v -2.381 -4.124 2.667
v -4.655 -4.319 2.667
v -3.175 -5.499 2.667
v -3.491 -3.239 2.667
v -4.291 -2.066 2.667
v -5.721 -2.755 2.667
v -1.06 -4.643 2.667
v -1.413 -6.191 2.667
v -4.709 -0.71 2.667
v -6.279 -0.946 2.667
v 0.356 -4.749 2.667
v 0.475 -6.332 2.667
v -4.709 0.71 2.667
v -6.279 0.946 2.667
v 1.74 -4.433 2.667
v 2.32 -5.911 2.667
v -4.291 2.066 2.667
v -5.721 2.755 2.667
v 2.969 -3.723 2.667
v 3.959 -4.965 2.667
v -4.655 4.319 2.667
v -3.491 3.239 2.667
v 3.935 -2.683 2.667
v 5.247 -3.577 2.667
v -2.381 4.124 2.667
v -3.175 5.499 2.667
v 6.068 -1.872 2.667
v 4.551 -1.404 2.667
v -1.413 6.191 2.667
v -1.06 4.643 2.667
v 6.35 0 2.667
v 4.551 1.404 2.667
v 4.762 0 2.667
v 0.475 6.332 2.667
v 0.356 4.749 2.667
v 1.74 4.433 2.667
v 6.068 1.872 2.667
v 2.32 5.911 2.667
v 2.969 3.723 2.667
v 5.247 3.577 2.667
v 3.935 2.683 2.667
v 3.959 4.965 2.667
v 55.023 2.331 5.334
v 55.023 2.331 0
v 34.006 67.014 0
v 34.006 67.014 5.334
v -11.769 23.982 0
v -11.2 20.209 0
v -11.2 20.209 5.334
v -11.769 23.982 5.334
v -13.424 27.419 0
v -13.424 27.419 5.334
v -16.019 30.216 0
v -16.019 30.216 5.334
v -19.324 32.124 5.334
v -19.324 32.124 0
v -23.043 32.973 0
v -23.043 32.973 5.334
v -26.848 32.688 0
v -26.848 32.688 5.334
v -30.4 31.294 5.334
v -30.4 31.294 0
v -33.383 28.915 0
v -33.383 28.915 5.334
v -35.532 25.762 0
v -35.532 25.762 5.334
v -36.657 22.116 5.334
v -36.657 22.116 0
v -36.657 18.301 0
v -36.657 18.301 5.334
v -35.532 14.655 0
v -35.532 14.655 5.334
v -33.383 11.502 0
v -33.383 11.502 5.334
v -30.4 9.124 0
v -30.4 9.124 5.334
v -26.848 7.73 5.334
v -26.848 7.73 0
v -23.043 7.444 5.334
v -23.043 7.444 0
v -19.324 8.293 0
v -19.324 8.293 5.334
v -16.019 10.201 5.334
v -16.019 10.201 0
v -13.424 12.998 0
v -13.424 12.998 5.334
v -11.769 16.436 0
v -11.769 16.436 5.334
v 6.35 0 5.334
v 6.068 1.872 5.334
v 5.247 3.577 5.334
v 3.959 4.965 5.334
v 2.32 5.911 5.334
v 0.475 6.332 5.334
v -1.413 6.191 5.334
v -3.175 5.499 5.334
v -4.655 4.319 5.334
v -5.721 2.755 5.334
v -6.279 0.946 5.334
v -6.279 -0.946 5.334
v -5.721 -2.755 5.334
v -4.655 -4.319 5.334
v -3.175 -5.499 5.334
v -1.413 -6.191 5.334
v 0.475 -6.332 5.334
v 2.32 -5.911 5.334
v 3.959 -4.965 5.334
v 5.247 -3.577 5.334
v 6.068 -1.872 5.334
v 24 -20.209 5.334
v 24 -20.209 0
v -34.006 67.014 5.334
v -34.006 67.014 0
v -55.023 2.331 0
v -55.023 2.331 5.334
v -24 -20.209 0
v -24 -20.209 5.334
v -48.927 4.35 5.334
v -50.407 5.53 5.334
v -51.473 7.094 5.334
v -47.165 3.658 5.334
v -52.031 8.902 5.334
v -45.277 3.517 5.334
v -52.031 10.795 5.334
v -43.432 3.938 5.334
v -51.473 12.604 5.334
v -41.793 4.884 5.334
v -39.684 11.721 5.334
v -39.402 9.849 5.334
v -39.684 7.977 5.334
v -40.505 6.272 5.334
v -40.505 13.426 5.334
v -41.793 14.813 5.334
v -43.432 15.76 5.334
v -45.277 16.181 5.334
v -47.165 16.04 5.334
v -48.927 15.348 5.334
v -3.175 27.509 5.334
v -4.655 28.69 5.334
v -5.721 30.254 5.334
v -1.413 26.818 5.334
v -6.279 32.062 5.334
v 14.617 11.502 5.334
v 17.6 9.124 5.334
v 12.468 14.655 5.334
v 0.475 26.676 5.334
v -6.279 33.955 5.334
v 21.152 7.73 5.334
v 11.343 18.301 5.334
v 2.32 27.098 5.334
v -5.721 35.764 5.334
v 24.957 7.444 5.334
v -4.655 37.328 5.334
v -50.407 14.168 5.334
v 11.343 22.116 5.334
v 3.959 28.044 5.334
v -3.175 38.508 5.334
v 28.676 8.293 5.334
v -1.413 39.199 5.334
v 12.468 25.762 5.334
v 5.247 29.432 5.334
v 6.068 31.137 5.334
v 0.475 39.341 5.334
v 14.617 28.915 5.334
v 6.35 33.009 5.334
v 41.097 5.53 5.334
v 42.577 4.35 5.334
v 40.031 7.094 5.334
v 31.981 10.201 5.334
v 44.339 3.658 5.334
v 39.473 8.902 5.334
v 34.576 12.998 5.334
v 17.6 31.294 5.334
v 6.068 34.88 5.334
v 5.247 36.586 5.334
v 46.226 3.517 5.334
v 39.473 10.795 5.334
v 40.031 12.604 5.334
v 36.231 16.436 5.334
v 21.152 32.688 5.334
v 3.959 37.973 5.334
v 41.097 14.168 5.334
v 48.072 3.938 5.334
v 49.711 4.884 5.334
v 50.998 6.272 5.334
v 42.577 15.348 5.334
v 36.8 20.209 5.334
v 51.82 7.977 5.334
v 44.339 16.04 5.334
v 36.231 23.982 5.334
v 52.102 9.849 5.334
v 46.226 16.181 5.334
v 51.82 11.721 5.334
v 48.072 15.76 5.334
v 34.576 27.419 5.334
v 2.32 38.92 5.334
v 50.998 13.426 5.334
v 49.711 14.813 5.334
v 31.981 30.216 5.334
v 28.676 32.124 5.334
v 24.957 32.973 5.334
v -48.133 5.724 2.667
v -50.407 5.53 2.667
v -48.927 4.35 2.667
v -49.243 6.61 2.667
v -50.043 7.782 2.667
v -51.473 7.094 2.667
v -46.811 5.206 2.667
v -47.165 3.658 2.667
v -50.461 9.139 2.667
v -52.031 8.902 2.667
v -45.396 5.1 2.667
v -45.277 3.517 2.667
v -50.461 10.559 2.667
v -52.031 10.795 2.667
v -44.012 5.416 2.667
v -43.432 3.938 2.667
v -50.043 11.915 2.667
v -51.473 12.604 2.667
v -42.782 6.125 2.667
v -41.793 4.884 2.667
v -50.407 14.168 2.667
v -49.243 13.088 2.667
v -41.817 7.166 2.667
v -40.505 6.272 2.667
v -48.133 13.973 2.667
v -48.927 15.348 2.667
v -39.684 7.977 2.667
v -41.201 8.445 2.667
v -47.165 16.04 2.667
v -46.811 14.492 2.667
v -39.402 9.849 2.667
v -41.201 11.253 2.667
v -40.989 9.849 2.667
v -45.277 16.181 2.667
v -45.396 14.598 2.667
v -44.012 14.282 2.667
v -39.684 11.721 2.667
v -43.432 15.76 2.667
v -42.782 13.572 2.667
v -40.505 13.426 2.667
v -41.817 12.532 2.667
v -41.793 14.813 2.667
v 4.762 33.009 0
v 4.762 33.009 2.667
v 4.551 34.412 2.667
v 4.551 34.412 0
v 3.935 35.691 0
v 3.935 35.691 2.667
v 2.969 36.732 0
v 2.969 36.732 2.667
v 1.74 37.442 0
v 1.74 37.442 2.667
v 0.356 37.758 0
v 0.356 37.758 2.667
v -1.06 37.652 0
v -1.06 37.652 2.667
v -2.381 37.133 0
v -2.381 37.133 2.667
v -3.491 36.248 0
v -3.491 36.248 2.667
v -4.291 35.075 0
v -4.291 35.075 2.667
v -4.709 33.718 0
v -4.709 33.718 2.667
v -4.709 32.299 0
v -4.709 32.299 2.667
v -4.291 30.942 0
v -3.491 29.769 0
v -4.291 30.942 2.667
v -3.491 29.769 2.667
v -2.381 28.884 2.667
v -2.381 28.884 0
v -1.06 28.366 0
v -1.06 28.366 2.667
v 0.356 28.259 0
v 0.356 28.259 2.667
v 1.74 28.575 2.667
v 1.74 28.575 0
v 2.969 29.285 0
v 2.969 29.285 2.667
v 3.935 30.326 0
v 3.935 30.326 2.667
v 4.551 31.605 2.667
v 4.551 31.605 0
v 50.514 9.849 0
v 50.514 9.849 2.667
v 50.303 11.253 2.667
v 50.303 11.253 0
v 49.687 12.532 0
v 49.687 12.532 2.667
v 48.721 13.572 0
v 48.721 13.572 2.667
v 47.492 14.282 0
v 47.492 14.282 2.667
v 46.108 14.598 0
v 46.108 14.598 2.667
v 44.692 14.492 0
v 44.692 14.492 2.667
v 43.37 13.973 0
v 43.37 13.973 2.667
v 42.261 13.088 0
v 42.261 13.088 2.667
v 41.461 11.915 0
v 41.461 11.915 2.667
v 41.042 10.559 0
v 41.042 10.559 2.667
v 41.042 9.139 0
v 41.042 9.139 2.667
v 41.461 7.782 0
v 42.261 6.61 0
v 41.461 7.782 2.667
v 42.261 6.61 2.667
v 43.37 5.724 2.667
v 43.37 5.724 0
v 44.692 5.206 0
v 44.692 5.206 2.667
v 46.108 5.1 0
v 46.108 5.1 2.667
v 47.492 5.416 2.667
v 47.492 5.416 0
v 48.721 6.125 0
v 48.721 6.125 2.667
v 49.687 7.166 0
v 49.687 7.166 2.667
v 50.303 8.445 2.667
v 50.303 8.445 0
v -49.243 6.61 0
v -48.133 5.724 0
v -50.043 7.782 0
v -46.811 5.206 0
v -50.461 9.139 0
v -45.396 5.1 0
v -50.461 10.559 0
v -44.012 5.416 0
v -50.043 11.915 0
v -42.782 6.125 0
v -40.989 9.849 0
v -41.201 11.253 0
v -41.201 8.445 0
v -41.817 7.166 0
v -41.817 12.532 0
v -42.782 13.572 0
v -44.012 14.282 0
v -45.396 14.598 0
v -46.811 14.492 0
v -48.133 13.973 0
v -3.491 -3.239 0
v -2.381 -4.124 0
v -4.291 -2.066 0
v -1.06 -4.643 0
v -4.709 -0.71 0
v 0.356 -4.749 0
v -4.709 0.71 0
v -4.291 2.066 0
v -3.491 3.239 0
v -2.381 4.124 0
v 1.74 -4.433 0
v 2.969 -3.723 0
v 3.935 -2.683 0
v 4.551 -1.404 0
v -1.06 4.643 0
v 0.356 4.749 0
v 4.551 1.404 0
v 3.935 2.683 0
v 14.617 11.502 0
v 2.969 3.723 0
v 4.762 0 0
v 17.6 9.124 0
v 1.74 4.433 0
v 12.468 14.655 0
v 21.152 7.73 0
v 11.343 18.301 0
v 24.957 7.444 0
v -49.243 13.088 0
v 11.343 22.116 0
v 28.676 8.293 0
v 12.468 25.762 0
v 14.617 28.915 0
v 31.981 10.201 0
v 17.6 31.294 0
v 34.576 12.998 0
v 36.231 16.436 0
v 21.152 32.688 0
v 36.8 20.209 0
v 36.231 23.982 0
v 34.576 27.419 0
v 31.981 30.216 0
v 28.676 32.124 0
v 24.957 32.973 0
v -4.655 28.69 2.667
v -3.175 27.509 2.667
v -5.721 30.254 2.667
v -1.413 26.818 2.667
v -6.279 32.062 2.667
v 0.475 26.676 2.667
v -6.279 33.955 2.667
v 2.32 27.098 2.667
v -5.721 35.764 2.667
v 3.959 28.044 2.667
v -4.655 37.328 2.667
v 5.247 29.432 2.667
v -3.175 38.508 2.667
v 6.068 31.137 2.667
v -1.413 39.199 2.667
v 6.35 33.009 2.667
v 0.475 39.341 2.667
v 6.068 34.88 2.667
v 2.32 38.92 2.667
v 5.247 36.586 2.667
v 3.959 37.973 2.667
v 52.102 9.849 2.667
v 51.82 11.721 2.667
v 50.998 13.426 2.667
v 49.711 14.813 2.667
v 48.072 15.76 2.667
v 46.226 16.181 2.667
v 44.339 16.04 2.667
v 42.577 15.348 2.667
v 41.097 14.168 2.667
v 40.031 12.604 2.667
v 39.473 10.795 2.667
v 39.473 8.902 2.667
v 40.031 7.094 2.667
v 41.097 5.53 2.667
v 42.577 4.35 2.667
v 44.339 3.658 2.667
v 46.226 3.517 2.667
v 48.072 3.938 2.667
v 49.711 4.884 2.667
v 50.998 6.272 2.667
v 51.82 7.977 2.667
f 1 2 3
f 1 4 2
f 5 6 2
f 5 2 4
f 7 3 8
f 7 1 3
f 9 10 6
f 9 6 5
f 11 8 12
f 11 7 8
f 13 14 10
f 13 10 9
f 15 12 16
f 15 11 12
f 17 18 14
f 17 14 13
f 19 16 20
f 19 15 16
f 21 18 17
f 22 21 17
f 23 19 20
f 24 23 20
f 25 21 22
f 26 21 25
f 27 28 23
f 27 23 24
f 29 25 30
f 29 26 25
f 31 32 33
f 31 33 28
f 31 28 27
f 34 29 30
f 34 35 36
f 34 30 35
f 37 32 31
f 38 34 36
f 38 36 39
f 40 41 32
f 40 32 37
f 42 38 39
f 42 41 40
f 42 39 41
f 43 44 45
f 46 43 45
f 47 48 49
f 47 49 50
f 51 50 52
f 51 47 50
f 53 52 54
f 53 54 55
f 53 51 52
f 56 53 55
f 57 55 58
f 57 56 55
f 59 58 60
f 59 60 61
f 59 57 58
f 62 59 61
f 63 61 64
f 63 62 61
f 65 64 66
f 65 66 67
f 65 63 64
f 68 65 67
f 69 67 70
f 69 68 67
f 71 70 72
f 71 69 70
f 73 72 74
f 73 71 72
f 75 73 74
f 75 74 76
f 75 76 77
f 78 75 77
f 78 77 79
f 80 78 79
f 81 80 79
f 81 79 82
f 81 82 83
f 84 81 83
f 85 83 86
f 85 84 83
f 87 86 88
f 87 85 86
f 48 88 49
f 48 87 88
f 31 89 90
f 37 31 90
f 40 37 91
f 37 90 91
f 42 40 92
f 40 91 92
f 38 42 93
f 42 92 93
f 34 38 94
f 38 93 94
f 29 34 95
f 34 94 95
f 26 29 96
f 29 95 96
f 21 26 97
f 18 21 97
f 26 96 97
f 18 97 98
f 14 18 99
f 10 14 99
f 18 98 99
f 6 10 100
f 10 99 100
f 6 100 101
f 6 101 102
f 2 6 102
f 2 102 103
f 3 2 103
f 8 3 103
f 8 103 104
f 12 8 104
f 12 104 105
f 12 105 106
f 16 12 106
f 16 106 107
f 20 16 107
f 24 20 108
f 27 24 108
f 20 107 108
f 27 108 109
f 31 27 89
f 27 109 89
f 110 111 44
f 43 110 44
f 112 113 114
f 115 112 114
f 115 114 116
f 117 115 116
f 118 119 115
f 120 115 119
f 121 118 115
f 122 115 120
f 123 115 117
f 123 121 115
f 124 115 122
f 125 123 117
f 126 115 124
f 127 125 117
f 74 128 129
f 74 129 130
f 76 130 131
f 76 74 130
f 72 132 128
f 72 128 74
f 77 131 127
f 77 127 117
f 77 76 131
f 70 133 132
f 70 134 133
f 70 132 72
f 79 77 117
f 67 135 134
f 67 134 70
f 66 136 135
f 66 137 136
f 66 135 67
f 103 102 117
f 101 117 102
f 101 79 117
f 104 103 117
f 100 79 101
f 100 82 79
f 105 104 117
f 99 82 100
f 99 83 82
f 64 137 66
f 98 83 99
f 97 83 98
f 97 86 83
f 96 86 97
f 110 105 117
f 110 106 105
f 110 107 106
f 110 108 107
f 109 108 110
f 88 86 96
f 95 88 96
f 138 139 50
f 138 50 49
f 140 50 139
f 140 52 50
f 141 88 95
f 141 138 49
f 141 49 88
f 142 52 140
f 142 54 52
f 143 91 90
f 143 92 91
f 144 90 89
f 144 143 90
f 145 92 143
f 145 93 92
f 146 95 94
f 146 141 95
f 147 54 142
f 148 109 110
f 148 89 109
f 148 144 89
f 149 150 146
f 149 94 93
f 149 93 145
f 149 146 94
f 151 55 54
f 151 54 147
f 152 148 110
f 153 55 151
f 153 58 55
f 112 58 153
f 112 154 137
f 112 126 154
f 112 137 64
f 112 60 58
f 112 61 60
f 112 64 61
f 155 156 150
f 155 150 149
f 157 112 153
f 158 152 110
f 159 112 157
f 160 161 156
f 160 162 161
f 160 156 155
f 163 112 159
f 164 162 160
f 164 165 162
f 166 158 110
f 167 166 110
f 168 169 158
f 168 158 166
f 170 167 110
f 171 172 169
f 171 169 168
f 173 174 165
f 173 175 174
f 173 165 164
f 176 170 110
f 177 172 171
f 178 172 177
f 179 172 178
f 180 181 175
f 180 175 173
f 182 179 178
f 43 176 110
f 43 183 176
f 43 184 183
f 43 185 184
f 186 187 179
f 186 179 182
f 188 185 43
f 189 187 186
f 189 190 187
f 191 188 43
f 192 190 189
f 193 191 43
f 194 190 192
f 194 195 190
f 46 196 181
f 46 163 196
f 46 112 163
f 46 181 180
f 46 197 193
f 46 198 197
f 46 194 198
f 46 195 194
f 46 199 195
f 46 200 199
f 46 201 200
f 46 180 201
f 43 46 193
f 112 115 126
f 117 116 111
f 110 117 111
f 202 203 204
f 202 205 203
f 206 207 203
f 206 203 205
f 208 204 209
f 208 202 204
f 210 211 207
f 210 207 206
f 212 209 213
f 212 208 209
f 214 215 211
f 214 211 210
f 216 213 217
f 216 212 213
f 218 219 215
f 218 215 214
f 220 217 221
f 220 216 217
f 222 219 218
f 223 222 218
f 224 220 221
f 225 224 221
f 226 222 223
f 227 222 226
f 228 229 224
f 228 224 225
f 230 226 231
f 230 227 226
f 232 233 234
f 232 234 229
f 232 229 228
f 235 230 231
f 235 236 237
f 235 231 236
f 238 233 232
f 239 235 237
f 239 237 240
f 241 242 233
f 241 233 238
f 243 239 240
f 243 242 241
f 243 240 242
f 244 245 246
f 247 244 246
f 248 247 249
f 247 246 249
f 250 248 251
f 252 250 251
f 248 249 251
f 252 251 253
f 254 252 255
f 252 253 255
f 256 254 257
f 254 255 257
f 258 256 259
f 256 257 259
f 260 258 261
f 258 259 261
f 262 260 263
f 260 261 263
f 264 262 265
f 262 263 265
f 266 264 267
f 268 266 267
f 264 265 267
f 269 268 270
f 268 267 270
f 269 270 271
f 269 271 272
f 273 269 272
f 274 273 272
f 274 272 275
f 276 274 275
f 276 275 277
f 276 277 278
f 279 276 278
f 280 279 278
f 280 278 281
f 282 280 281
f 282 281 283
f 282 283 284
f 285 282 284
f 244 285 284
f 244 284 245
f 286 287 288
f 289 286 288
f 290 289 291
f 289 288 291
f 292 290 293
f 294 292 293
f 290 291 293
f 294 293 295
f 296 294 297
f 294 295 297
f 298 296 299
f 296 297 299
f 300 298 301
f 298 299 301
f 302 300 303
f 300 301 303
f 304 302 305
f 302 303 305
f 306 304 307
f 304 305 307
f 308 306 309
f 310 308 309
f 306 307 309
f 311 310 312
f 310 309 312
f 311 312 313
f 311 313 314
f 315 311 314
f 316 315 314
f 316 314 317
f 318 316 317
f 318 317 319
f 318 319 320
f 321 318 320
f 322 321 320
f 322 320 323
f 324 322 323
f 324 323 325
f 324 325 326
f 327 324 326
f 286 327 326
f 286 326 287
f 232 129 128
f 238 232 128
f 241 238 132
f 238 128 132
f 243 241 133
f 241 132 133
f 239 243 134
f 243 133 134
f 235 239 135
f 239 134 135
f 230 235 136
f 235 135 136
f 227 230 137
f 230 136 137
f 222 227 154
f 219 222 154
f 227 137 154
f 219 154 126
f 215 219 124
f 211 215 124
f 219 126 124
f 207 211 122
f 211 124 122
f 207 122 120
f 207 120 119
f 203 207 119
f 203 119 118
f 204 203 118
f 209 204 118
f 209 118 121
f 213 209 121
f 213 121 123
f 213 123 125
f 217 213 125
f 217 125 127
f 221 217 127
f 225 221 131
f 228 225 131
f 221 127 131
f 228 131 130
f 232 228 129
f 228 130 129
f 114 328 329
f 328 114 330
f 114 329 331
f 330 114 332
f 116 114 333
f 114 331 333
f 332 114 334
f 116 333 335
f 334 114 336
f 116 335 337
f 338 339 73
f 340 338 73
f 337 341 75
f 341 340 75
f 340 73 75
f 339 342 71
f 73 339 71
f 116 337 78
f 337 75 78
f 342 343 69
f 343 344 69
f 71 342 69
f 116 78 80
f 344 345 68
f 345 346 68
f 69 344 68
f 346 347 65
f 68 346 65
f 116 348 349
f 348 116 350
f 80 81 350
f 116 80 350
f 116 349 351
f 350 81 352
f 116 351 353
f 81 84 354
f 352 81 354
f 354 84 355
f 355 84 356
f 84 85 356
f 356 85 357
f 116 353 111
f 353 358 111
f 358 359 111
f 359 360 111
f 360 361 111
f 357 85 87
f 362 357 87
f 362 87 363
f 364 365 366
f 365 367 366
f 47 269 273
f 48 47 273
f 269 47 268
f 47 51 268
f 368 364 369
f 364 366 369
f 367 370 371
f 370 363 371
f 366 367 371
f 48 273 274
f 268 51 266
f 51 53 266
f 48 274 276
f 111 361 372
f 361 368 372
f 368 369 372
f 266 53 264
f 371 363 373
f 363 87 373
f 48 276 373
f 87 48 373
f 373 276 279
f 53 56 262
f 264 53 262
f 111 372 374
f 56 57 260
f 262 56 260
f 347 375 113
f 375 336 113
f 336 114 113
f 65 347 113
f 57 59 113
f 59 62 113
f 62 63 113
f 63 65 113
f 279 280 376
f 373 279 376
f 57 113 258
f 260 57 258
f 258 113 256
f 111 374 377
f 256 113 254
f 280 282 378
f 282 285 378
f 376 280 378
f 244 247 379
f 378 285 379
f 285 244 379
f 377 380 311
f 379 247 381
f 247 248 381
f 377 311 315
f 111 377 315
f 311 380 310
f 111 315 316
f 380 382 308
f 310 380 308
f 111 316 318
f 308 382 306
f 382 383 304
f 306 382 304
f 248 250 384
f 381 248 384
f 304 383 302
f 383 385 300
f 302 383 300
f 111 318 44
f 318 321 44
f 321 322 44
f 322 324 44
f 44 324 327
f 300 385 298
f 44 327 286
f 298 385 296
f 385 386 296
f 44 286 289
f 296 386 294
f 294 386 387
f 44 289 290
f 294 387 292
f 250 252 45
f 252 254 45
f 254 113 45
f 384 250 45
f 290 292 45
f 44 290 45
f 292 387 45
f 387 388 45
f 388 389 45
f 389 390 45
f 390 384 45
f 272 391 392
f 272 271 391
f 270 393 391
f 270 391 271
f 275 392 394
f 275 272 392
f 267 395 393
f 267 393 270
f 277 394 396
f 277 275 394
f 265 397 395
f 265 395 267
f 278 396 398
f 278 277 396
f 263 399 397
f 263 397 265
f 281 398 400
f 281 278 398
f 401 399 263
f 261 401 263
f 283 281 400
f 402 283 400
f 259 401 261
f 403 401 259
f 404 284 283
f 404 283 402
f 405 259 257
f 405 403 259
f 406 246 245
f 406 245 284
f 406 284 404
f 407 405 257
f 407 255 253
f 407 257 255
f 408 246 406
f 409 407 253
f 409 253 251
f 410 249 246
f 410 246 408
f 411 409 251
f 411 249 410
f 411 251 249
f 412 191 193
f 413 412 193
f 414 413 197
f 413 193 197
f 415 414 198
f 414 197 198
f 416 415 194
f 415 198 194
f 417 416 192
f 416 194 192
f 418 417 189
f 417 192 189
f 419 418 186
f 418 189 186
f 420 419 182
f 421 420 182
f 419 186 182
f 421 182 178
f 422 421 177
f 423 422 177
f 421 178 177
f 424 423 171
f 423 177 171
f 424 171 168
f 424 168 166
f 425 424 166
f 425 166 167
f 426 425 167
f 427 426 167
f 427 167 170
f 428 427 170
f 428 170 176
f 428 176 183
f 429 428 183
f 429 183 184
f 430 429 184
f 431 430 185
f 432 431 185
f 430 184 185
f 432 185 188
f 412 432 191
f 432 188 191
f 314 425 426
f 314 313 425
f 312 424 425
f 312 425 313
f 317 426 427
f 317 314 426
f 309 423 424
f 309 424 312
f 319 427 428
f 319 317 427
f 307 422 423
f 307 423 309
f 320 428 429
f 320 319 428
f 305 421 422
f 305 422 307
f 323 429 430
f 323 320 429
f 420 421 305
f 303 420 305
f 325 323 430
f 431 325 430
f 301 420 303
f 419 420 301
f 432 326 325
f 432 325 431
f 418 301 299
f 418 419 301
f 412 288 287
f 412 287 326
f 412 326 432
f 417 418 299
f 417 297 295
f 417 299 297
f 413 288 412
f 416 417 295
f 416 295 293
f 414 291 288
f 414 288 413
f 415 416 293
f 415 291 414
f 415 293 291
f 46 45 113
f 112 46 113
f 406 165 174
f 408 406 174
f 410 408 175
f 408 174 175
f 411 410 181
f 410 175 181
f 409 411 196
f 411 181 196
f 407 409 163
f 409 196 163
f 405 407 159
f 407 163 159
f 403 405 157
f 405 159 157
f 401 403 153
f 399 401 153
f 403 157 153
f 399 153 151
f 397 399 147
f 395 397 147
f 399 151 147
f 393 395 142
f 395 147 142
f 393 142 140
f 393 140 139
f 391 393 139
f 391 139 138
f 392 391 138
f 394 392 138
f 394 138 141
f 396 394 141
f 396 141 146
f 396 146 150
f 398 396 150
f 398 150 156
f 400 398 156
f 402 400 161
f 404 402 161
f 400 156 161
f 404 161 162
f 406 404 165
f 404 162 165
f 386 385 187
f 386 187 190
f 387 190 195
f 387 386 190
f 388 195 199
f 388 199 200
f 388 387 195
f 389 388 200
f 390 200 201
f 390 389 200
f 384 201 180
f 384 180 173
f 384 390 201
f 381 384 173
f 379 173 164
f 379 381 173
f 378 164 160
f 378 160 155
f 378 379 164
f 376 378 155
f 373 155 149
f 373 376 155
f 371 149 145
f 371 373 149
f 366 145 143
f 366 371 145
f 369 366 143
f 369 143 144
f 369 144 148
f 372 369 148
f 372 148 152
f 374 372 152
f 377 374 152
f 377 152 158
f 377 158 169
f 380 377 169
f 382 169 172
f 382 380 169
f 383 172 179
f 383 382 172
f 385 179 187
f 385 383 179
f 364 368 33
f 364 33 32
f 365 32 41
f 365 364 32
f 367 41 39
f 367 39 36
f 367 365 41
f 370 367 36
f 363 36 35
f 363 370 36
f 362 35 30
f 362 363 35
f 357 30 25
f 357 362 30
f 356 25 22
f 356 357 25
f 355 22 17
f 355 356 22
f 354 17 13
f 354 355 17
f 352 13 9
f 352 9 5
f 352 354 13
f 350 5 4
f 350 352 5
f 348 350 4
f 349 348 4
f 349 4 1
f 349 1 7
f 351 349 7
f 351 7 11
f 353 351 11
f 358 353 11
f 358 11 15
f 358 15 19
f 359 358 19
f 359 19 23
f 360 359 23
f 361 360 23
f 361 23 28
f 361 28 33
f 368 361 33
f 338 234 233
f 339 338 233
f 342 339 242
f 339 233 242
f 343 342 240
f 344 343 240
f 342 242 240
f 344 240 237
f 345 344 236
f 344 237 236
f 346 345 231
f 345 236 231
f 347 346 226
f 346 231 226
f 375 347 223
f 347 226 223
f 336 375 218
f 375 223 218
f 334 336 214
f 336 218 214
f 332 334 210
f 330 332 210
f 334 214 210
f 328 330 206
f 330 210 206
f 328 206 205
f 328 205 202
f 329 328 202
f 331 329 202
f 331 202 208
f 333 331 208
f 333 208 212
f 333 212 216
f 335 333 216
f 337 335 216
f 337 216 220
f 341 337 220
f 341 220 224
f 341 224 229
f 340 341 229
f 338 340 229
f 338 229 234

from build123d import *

# Parameters (mm, degrees)
SKETCH2_R           = 4.7625
SKETCH2_R_2         = 12.8
BOSS_EXTRUDE2_DEPTH = 5.334
CUT_EXTRUDE3_START  = -2.667
SKETCH3_R           = 6.35
SKETCH3_R_2         = 4.7625
CUT_EXTRUDE3_DEPTH  = 2.667
SKETCH3_2_R         = 4.7625
CUT_EXTRUDE4_DEPTH  = 87.872399887


with BuildPart() as part:
    # Sketch2 → Boss-Extrude2 (new body)
    with BuildSketch(Plane.XY):
        Polygon((-55.022779977, 2.330692017), (-24, -20.208676973), (24, -20.208676973), (55.022779977, 2.330692017), (34.005948181, 67.013849238), (-34.005948181, 67.013849238), align=None)
        Circle(SKETCH2_R, mode=Mode.SUBTRACT)
        with Locations((-24, 20.208676973)):
            Circle(SKETCH2_R_2, mode=Mode.SUBTRACT)
        with Locations((24, 20.208676973)):
            Circle(SKETCH2_R_2, mode=Mode.SUBTRACT)
    extrude(amount=BOSS_EXTRUDE2_DEPTH)

    # Sketch3 → Cut-Extrude3 (cut)
    # profile 1 of 4: a face of its own
    with BuildSketch(Plane.XY.offset(5.334).offset(CUT_EXTRUDE3_START)):
        Circle(SKETCH3_R)
        Circle(SKETCH3_R_2, mode=Mode.SUBTRACT)
    # profile 2 of 4: a face of its own
    with BuildSketch(Plane.XY.offset(5.334).offset(CUT_EXTRUDE3_START)):
        with Locations((45.751679669, 9.848845061)):
            Circle(SKETCH3_R)
        with Locations((45.751679669, 9.848845061)):
            Circle(SKETCH3_R_2, mode=Mode.SUBTRACT)
    # profile 3 of 4: a face of its own
    with BuildSketch(Plane.XY.offset(5.334).offset(CUT_EXTRUDE3_START)):
        with Locations((0, 33.008676973)):
            Circle(SKETCH3_R)
        with Locations((0, 33.008676973)):
            Circle(SKETCH3_R_2, mode=Mode.SUBTRACT)
    # profile 4 of 4: a face of its own
    with BuildSketch(Plane.XY.offset(5.334).offset(CUT_EXTRUDE3_START)):
        with Locations((-45.751679669, 9.848845061)):
            Circle(SKETCH3_R)
        with Locations((-45.751679669, 9.848845061)):
            Circle(SKETCH3_R_2, mode=Mode.SUBTRACT)
    extrude(amount=CUT_EXTRUDE3_DEPTH, mode=Mode.SUBTRACT)

    # Sketch3<2> → Cut-Extrude4 (cut, through all)
    with BuildSketch(Plane.XY.offset(5.334)):
        with Locations((45.751679669, 9.848845061)):
            Circle(SKETCH3_2_R)
        with Locations((0, 33.008676973)):
            Circle(SKETCH3_2_R)
        with Locations((-45.751679669, 9.848845061)):
            Circle(SKETCH3_2_R)
    extrude(amount=-CUT_EXTRUDE4_DEPTH, mode=Mode.SUBTRACT)


solid = part.part
